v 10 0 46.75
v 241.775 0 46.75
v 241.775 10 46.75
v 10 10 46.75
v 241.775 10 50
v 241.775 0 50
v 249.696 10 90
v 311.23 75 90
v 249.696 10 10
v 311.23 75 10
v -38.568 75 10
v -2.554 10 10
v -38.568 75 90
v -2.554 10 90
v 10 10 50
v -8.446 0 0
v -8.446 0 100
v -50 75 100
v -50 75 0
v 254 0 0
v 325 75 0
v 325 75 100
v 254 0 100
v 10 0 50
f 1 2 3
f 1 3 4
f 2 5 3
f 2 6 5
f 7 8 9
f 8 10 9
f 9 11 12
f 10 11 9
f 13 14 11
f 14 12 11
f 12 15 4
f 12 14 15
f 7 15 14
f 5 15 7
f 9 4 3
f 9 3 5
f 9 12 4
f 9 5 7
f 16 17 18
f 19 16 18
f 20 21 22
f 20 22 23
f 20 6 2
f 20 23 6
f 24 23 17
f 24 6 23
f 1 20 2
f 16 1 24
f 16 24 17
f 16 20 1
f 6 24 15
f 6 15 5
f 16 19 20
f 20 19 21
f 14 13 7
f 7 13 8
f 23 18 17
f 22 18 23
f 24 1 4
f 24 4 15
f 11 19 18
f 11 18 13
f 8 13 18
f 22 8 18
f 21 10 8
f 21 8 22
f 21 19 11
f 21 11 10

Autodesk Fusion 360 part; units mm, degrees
sketch "hopper" plane through (0, 0, 0) normal (0, 0, 1) x (1, 0, 0)
  line L0 (0, 0) -> (254, 0)
  line L1 (0, 0) -> (-8.4458, 0)
  line L2 (-8.4458, 0) -> (-50, 75)
  line L3 (-50, 75) -> (325, 75)
  line L4 (325, 75) -> (254, 0)
  dimension "d4" = 375
  dimension "d5" = 61.011
  dimension "d6" = 46.569
  dimension "d7" = 75
  dimension "d19" = 262.4458
extrude "Extrude1" add sketch "hopper" along normal blind 100
shell "Shell1" thickness 10 removed faces 1 at (75, 75, 33.3333)
sketch "tube slot" plane through (0, 0, 0) normal (0, 1, 0) x (1, 0, 0)
  line L0 (10, -50) -> (241.775, -50)
  line L1 (241.775, -50) -> (241.775, -46.75)
  line L2 (241.775, -46.75) -> (10, -46.75)
  line L3 (10, -46.75) -> (10, -50)
  line L4 (-8.4458, -100) -> (254, -100)
  line L5 (254, 0) -> (254, -100)
  dimension "d11" = 231.775
  dimension "d12" = 3.25
  dimension "d15" = 50
  dimension "d16" = 12.225
extrude "Extrude2" cut sketch "tube slot" along normal blind 30
